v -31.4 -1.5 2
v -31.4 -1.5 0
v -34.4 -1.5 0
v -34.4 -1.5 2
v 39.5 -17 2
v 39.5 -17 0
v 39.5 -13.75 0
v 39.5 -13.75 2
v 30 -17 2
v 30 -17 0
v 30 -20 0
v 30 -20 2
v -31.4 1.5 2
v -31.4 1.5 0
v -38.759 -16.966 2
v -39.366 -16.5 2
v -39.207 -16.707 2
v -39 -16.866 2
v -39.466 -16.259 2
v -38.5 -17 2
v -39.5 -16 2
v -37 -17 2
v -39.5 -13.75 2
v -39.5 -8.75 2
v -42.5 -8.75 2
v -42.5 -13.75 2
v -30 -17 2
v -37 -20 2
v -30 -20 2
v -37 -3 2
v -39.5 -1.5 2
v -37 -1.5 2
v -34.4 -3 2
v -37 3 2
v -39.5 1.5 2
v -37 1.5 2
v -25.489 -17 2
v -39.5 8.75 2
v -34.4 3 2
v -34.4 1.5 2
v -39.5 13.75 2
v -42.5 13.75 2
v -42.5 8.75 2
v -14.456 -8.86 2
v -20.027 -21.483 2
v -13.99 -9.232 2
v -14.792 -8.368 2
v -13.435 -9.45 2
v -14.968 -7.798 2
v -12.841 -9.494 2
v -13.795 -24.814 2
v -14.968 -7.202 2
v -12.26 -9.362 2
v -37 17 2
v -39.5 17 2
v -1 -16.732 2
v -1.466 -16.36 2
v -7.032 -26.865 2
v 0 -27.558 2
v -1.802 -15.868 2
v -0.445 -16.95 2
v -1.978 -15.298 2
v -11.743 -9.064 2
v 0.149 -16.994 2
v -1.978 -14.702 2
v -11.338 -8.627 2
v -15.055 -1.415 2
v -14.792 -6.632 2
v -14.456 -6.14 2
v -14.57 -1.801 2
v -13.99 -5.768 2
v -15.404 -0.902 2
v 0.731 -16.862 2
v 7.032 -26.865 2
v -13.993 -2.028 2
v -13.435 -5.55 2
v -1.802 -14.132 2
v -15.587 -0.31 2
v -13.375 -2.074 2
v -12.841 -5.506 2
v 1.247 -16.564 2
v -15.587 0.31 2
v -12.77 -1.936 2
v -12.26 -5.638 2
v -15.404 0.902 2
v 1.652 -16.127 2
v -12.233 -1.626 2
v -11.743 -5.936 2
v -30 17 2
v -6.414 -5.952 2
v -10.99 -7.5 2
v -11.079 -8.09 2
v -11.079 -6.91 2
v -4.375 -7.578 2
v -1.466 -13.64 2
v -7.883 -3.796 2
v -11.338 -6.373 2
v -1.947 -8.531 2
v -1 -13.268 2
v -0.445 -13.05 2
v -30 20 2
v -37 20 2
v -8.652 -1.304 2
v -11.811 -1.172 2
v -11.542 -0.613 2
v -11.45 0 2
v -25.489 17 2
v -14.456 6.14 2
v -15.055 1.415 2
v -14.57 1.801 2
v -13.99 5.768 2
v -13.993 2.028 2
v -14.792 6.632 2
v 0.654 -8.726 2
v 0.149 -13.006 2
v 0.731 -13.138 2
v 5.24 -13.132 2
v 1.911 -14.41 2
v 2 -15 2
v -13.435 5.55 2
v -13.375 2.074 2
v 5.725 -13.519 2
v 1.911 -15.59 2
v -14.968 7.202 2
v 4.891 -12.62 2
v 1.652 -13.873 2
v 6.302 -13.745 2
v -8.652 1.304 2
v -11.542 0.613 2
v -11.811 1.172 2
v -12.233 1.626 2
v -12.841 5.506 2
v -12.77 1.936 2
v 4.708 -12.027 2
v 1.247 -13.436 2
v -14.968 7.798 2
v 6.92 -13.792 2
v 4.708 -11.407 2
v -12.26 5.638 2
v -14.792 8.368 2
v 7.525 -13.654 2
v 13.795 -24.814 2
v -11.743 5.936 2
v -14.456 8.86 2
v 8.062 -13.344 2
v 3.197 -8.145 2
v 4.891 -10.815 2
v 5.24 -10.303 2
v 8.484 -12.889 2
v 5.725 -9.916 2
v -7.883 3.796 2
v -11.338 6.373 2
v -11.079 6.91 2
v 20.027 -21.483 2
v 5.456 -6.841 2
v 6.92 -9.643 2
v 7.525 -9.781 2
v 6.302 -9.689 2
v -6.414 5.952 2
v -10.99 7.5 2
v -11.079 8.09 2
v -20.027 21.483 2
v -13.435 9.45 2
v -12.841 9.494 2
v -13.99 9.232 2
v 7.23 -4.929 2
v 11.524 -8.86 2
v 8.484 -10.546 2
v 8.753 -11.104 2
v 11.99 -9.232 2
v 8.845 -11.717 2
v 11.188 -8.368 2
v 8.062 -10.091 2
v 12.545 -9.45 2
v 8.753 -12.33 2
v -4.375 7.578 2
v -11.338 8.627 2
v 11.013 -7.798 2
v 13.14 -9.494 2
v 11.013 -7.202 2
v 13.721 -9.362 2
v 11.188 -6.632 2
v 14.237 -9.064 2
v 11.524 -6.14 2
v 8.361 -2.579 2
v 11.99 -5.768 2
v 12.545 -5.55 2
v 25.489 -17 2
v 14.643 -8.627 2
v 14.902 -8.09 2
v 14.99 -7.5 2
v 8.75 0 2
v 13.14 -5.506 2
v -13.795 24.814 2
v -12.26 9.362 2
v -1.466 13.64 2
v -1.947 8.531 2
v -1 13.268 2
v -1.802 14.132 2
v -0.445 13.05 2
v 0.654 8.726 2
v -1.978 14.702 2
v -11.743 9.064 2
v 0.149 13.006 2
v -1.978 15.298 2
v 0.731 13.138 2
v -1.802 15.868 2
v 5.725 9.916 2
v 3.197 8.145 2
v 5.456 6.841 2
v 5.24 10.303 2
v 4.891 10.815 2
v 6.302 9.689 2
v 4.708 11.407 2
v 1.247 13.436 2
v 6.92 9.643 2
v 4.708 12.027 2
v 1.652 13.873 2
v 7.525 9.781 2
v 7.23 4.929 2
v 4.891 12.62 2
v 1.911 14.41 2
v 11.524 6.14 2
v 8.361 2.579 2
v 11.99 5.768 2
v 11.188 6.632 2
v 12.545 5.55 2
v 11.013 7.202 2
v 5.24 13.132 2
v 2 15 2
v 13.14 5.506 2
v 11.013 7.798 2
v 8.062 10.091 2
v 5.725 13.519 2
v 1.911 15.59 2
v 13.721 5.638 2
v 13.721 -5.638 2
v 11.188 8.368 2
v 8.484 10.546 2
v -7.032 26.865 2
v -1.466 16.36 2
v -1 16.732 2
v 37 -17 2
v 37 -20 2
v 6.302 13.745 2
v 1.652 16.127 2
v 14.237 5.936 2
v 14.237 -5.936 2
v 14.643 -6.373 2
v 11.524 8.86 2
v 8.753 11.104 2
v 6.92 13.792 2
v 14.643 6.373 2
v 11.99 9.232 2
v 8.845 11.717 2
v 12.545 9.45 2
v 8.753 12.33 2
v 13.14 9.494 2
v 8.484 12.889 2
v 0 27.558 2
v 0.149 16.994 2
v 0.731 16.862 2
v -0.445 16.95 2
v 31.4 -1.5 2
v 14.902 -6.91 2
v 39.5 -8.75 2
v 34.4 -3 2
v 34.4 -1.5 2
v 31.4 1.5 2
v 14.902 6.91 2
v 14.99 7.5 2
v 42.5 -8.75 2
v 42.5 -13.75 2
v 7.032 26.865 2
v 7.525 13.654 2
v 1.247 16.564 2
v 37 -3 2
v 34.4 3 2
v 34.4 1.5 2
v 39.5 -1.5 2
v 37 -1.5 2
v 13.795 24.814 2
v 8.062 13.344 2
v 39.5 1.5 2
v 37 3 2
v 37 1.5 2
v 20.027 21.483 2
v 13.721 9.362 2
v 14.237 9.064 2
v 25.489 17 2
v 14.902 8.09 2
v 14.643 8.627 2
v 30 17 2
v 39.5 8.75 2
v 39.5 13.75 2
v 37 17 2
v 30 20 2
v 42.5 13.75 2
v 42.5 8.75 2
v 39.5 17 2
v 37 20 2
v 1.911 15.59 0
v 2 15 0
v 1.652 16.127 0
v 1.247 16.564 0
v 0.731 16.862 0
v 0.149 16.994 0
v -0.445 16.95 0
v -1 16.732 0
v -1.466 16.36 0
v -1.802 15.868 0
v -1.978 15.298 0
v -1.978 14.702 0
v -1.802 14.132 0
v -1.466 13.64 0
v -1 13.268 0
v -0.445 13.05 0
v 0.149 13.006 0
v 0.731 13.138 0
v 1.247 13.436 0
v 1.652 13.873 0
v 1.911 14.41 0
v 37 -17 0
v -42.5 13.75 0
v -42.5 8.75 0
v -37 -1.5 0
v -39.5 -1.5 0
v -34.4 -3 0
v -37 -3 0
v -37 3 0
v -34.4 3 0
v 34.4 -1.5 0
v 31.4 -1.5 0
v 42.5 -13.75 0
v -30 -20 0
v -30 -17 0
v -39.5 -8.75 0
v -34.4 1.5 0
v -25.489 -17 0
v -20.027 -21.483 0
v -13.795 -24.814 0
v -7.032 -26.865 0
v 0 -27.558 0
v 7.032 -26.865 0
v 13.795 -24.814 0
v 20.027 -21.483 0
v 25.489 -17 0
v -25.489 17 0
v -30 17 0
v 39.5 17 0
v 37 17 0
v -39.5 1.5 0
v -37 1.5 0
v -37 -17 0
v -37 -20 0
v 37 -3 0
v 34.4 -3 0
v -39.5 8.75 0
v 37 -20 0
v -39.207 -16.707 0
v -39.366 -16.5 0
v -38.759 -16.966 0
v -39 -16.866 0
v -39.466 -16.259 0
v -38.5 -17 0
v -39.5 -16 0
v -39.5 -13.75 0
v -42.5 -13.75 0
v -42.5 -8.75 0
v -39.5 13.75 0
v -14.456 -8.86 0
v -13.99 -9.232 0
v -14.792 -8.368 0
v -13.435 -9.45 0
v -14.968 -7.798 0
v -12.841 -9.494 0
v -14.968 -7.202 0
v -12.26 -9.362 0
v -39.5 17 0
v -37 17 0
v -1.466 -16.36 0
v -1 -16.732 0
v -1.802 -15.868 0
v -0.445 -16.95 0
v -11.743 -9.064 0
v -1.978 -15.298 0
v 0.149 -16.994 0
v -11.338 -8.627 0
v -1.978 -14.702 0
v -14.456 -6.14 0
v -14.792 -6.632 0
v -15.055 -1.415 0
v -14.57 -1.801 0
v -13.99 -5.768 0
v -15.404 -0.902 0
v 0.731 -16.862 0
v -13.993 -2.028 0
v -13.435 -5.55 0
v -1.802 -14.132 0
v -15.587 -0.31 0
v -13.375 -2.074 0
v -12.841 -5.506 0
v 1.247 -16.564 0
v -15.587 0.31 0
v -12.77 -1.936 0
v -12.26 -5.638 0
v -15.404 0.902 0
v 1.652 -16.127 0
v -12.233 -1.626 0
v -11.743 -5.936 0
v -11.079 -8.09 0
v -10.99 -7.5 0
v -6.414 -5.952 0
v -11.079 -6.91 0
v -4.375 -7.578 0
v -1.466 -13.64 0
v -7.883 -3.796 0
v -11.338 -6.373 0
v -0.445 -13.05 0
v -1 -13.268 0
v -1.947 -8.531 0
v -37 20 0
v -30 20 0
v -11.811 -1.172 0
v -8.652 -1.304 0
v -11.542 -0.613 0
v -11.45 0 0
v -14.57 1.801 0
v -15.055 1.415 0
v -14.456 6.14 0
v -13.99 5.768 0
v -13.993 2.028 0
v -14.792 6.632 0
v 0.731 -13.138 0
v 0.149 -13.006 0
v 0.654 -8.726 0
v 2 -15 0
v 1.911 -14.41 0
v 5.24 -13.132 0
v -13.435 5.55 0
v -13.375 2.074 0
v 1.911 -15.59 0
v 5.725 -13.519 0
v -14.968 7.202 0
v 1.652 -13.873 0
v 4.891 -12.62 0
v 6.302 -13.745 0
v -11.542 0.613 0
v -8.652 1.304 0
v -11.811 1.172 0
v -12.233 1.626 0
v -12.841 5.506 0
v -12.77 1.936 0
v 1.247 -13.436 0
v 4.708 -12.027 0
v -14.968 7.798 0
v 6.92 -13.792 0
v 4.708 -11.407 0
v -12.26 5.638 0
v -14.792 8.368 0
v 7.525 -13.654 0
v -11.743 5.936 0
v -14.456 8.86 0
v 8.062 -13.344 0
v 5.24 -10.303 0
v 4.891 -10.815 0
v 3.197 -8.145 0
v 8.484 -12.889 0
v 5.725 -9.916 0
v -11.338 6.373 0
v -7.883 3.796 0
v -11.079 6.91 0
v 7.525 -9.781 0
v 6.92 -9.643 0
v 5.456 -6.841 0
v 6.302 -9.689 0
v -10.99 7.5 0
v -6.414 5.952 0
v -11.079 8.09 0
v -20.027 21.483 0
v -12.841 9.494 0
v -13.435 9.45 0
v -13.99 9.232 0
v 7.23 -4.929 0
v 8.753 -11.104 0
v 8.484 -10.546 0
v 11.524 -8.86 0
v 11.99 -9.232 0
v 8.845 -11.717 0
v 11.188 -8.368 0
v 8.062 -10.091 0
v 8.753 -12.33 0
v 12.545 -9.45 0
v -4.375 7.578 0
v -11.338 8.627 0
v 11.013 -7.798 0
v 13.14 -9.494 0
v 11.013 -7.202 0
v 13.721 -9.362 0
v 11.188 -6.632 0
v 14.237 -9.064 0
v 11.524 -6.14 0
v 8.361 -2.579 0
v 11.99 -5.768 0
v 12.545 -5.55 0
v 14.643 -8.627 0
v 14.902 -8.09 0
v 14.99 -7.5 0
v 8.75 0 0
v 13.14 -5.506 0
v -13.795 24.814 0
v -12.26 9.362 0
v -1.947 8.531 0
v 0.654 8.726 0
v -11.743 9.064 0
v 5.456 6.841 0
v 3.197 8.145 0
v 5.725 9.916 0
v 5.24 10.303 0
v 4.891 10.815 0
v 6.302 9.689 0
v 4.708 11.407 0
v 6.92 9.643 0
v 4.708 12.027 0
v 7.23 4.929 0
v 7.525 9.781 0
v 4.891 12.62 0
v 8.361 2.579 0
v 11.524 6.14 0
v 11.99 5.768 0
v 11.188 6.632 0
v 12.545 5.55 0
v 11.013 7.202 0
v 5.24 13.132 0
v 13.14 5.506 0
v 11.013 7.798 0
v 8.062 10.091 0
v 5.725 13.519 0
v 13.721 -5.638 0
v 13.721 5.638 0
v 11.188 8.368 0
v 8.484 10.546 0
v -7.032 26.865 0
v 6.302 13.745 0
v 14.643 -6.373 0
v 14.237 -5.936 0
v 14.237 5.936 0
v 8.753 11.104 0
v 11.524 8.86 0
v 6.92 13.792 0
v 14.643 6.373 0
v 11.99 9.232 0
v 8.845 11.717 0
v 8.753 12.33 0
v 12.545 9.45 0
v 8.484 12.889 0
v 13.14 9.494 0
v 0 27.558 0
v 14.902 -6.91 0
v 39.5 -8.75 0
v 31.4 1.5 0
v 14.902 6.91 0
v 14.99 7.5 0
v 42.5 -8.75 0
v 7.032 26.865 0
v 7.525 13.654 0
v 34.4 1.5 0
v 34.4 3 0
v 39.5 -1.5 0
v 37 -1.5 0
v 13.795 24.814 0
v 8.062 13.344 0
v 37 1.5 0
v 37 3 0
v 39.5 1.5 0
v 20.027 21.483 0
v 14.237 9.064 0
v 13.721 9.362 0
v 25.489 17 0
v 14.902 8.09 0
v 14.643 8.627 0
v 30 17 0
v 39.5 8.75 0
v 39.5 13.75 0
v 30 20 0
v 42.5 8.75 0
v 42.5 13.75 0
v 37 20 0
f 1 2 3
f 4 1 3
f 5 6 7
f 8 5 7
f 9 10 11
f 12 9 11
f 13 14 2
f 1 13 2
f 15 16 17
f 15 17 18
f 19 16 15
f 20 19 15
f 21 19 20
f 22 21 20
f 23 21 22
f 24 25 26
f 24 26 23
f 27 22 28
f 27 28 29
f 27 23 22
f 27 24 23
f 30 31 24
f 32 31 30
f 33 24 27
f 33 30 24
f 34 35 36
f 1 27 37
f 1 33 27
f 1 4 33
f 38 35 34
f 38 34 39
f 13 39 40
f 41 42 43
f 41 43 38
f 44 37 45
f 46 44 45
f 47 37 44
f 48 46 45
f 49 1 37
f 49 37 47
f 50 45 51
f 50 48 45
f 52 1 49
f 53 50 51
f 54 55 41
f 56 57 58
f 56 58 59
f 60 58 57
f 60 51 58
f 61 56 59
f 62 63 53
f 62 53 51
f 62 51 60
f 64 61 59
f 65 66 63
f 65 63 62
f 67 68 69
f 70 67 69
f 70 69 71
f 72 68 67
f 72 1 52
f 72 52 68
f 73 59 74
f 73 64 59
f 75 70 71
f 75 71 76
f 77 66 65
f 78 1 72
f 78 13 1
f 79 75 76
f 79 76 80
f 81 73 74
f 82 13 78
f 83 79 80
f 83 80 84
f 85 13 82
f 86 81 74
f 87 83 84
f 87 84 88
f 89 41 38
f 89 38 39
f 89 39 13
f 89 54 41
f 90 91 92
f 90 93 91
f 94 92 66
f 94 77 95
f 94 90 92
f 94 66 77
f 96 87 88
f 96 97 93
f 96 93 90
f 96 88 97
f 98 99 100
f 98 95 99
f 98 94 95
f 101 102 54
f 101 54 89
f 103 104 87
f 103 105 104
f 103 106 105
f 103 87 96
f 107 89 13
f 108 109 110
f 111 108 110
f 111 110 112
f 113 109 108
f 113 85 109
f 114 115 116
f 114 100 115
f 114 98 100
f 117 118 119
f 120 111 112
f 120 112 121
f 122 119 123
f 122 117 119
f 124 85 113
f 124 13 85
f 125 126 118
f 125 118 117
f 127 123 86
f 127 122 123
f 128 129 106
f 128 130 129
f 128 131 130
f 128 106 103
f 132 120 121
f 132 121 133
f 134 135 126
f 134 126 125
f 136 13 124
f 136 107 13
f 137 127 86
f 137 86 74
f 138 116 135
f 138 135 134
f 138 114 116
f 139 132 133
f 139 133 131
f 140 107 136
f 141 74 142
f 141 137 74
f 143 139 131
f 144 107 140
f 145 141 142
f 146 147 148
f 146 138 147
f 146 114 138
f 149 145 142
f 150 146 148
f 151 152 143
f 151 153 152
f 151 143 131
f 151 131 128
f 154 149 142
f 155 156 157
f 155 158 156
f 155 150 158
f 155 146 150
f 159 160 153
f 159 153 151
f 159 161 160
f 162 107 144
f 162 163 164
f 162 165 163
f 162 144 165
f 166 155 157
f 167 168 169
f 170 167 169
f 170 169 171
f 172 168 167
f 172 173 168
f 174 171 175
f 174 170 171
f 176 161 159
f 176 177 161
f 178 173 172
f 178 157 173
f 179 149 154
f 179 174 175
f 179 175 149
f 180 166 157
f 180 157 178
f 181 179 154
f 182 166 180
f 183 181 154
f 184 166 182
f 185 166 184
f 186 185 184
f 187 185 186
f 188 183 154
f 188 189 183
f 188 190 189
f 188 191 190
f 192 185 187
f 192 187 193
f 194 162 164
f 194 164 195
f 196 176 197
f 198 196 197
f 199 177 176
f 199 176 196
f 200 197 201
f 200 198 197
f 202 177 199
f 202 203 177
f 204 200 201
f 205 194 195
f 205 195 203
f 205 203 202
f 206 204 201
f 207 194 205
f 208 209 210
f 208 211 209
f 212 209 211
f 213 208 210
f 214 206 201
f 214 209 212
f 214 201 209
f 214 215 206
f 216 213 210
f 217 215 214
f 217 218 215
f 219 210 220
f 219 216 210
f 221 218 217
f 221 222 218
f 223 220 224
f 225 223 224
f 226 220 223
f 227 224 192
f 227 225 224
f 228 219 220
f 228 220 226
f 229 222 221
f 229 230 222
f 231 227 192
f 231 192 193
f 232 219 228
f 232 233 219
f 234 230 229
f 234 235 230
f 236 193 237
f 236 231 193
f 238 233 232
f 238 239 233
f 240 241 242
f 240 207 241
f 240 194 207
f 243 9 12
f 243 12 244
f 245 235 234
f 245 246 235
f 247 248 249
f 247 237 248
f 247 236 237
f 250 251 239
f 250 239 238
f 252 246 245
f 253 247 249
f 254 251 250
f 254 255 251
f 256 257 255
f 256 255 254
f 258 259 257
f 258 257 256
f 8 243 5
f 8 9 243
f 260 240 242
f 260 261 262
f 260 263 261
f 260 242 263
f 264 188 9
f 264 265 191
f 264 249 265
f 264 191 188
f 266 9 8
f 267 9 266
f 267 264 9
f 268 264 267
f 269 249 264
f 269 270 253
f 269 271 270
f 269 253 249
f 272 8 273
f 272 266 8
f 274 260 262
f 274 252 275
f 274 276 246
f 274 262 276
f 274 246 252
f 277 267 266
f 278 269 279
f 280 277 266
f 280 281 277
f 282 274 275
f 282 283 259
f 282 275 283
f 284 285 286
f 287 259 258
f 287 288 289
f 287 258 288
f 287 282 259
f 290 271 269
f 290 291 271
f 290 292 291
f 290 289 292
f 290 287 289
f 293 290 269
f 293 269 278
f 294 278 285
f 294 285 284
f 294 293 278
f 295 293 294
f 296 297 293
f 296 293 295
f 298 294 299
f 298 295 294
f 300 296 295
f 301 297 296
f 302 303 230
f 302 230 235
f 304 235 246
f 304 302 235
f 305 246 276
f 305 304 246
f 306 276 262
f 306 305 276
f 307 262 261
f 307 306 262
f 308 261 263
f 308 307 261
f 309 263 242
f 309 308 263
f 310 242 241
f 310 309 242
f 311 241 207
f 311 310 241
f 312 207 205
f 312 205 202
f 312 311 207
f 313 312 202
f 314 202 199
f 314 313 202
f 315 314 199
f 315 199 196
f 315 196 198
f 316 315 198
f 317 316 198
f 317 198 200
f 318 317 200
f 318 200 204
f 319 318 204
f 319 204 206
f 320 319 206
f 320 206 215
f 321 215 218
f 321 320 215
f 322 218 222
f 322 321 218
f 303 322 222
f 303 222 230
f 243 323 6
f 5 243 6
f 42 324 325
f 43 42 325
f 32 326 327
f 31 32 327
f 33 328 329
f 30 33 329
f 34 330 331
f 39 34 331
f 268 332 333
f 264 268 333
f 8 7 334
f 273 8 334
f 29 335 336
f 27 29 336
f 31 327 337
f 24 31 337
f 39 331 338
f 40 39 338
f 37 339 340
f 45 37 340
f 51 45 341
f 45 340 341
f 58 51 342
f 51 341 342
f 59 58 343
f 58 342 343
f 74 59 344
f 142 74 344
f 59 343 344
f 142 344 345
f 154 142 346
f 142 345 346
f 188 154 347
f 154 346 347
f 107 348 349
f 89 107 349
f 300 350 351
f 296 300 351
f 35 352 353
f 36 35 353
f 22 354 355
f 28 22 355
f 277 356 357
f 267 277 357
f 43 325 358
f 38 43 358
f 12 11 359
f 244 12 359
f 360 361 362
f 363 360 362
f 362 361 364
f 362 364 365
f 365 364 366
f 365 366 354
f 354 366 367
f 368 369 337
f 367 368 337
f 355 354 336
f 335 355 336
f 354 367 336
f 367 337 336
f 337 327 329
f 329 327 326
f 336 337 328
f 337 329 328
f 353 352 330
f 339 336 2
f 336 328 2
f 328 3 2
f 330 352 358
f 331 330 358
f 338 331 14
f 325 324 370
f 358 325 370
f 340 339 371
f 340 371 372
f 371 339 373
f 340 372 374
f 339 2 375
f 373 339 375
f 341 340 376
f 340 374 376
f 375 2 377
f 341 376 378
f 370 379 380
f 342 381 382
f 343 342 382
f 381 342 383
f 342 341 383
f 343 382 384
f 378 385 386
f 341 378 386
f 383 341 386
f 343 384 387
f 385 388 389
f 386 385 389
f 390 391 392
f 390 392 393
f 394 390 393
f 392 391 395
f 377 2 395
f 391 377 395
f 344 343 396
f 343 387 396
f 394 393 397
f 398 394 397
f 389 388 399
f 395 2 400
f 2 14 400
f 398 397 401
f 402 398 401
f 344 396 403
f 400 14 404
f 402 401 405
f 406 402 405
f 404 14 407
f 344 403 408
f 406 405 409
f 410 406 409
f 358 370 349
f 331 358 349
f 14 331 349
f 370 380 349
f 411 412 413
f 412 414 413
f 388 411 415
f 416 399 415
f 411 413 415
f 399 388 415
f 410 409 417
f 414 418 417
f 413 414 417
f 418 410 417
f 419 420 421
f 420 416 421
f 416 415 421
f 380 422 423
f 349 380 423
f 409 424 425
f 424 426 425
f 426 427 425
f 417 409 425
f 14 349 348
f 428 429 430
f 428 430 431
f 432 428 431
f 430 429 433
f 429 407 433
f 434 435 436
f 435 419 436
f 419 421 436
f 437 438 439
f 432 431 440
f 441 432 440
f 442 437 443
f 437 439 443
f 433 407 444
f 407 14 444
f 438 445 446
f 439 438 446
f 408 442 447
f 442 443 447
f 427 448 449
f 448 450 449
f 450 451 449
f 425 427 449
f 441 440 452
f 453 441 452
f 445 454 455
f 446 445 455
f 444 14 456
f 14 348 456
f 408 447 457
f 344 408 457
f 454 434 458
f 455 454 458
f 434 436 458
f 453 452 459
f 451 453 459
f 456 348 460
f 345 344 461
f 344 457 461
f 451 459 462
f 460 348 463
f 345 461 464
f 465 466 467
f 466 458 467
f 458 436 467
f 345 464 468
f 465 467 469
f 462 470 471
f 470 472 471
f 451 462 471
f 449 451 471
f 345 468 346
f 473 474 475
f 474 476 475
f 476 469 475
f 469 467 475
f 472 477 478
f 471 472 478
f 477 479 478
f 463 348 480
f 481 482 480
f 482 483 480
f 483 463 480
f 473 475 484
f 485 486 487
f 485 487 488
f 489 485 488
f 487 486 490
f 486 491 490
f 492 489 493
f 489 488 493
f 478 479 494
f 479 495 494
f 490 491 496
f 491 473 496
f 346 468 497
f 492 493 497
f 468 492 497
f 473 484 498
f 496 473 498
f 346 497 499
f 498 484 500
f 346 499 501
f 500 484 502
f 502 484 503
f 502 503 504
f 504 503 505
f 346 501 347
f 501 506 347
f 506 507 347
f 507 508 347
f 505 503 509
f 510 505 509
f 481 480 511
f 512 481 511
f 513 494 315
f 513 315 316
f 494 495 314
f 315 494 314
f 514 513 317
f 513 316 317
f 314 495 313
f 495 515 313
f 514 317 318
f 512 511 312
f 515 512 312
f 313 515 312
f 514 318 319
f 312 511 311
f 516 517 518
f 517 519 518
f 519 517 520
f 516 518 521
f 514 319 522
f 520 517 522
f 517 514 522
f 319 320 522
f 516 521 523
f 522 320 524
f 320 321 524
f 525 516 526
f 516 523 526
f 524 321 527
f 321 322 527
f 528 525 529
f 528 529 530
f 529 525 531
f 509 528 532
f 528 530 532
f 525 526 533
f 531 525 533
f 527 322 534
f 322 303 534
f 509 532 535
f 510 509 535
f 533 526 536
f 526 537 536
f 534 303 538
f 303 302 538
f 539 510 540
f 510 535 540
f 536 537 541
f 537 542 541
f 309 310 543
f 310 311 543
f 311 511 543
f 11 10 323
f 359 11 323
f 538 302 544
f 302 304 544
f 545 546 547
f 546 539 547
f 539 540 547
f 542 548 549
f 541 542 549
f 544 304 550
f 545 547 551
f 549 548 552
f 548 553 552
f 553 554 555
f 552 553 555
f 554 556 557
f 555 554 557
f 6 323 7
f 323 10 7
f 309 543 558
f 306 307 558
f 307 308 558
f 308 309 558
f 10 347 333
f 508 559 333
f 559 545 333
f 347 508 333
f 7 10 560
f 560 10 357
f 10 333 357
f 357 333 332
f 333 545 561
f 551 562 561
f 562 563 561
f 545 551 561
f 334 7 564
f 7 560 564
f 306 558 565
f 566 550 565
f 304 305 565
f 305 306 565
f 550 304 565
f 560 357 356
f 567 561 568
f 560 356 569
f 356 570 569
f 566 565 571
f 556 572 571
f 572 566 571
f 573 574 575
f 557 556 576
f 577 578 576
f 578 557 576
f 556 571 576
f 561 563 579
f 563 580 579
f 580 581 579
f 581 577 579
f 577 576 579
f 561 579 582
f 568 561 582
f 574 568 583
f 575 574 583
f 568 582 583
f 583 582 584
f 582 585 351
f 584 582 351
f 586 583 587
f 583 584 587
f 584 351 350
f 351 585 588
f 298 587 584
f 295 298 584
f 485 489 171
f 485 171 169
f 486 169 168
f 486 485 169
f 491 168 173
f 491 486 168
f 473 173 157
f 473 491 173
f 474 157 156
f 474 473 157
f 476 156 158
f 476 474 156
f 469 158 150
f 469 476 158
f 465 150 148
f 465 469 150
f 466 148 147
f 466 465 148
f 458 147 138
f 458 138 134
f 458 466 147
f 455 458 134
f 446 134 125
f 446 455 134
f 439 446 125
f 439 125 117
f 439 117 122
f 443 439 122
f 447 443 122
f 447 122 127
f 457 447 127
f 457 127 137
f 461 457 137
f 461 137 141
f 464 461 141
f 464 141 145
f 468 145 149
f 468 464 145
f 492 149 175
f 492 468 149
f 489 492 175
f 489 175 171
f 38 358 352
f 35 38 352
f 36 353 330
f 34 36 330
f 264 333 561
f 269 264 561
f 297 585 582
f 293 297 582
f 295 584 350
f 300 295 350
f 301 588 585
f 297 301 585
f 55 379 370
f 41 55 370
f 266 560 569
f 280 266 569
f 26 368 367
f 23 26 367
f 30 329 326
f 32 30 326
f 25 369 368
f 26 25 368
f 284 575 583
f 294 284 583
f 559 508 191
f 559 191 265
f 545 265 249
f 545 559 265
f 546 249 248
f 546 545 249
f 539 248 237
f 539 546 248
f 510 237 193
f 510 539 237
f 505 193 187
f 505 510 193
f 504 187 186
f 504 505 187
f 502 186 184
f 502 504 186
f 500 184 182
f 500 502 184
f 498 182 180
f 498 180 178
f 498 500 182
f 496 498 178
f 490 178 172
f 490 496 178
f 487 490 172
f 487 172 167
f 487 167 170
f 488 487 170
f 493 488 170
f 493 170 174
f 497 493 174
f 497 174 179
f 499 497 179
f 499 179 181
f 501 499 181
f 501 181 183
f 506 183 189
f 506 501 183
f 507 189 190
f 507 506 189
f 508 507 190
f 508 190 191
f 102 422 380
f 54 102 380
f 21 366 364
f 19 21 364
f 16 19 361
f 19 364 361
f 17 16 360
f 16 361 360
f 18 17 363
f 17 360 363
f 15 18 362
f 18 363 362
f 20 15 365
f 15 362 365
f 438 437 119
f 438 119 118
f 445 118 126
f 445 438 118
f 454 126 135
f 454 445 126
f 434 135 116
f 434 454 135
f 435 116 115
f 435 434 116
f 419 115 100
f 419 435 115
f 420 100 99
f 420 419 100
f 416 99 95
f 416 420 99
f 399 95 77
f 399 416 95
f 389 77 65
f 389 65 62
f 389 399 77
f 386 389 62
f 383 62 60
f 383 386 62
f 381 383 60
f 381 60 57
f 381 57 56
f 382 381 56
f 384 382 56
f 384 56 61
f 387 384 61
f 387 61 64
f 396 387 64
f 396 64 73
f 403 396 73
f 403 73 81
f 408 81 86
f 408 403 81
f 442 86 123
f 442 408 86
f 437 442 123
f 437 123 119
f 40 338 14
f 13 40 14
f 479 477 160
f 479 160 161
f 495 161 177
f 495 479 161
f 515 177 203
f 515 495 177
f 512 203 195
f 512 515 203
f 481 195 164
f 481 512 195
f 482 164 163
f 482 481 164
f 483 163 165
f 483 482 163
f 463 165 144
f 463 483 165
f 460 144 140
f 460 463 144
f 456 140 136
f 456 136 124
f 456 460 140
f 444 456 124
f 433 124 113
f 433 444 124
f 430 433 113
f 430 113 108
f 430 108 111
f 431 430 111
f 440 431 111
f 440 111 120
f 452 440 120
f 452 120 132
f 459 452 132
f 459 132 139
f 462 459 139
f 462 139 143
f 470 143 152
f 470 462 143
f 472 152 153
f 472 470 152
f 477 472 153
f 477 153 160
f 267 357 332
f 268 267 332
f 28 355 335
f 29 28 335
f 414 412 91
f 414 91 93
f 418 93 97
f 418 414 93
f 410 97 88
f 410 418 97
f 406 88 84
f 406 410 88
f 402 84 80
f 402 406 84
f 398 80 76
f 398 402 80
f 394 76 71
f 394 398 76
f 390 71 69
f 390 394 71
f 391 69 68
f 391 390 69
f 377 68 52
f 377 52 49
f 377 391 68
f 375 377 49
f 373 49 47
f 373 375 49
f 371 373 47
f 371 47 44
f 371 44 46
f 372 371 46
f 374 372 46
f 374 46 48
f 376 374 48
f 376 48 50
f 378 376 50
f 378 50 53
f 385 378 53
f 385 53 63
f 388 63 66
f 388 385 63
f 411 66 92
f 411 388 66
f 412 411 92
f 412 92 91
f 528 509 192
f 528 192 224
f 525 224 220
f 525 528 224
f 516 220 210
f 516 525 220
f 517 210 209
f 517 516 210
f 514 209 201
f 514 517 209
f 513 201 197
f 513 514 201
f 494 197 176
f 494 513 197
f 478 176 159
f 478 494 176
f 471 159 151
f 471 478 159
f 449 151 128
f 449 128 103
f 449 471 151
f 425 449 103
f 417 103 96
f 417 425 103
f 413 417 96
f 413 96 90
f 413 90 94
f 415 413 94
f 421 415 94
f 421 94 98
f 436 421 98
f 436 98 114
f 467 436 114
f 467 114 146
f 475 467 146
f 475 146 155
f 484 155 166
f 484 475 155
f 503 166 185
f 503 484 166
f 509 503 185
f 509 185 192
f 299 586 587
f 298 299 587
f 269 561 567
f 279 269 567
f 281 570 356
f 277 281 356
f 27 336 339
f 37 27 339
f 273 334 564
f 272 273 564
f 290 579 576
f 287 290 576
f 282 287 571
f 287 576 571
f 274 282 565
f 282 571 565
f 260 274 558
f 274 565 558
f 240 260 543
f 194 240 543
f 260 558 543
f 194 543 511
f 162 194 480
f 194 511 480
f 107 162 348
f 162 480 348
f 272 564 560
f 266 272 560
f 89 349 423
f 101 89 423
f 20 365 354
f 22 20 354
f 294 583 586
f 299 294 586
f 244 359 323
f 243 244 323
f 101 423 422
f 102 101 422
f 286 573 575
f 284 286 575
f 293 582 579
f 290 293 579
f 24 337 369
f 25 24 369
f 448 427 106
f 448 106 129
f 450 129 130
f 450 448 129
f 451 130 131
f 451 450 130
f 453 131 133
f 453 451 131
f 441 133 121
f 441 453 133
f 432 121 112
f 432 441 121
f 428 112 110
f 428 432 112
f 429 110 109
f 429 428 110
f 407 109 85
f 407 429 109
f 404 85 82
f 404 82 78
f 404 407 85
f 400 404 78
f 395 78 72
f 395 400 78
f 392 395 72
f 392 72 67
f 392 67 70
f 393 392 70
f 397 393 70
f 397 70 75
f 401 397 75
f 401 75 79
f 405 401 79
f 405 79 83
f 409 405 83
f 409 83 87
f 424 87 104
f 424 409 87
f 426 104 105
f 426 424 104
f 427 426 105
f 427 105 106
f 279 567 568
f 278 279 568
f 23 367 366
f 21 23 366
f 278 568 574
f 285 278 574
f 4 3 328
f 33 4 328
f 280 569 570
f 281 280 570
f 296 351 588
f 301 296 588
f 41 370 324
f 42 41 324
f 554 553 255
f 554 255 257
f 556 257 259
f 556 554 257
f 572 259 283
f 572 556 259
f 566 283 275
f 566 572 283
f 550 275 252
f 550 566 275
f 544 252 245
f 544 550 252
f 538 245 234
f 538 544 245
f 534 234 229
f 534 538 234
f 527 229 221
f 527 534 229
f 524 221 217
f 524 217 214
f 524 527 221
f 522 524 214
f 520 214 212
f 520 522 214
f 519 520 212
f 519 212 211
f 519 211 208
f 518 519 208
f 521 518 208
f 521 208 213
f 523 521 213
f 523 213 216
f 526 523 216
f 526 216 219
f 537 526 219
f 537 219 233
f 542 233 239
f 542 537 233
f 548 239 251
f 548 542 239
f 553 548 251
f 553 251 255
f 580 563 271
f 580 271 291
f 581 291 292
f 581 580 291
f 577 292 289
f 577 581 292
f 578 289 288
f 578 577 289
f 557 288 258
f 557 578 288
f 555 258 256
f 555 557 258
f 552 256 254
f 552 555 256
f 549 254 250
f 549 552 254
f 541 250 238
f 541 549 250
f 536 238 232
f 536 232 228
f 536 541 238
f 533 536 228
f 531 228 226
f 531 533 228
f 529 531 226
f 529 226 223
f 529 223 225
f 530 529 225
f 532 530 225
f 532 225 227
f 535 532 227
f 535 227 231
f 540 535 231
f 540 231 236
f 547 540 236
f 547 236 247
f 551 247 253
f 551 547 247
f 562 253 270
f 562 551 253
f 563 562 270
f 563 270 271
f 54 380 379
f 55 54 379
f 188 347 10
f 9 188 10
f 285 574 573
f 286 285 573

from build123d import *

# Parameters (mm, degrees)
SKETCH_1_R      = 2
SKETCH_1_R_2    = 2.08
SKETCH_1_R_3    = 8.75
EXTRUDE_2_DEPTH = 2


with BuildPart() as part:
    # 草图1 → 凸台-拉伸2 (new body)
    with BuildSketch(Plane.XY):
        with BuildLine():
            Line((-39.5, -13.75), (-39.5, -16))
            ThreePointArc((-39.5, -16), (-39.207106781, -16.707106781), (-38.5, -17))
            Line((-38.5, -17), (-37, -17))
            Line((-37, -17), (-37, -20))
            Line((-37, -20), (-30, -20))
            Line((-30, -20), (-30, -17))
            Line((-30, -17), (-25.488968202, -17))
            ThreePointArc((-25.488968202, -17), (0, -27.55787632), (25.488968202, -17))
            Line((25.488968202, -17), (30, -17))
            Line((30, -17), (30, -20))
            Line((30, -20), (37, -20))
            Line((37, -20), (37, -17))
            Line((37, -17), (39.5, -17))
            Line((39.5, -17), (39.5, -13.75))
            Line((39.5, -13.75), (42.5, -13.75))
            Line((42.5, -13.75), (42.5, -8.75))
            Line((42.5, -8.75), (39.5, -8.75))
            Line((39.5, -8.75), (39.5, -1.5))
            Line((39.5, -1.5), (37, -1.5))
            Line((37, -1.5), (37, -3))
            Line((37, -3), (34.4, -3))
            Line((34.4, -3), (34.4, -1.5))
            Line((34.4, -1.5), (31.4, -1.5))
            Line((31.4, -1.5), (31.4, 1.5))
            Line((31.4, 1.5), (34.4, 1.5))
            Line((34.4, 1.5), (34.4, 3))
            Line((34.4, 3), (37, 3))
            Line((37, 3), (37, 1.5))
            Line((37, 1.5), (39.5, 1.5))
            Line((39.5, 1.5), (39.5, 8.75))
            Line((39.5, 8.75), (42.5, 8.75))
            Line((42.5, 8.75), (42.5, 13.75))
            Line((42.5, 13.75), (39.5, 13.75))
            Line((39.5, 13.75), (39.5, 17))
            Line((39.5, 17), (37, 17))
            Line((37, 17), (37, 20))
            Line((37, 20), (30, 20))
            Line((30, 20), (30, 17))
            Line((30, 17), (25.488968202, 17))
            ThreePointArc((25.488968202, 17), (0, 27.55787632), (-25.488968202, 17))
            Line((-25.488968202, 17), (-30, 17))
            Line((-30, 17), (-30, 20))
            Line((-30, 20), (-37, 20))
            Line((-37, 20), (-37, 17))
            Line((-37, 17), (-39.5, 17))
            Line((-39.5, 17), (-39.5, 13.75))
            Line((-39.5, 13.75), (-42.5, 13.75))
            Line((-42.5, 13.75), (-42.5, 8.75))
            Line((-42.5, 8.75), (-39.5, 8.75))
            Line((-39.5, 8.75), (-39.5, 1.5))
            Line((-39.5, 1.5), (-37, 1.5))
            Line((-37, 1.5), (-37, 3))
            Line((-37, 3), (-34.4, 3))
            Line((-34.4, 3), (-34.4, 1.5))
            Line((-34.4, 1.5), (-31.4, 1.5))
            Line((-31.4, 1.5), (-31.4, -1.5))
            Line((-31.4, -1.5), (-34.4, -1.5))
            Line((-34.4, -1.5), (-34.4, -3))
            Line((-34.4, -3), (-37, -3))
            Line((-37, -3), (-37, -1.5))
            Line((-37, -1.5), (-39.5, -1.5))
            Line((-39.5, -1.5), (-39.5, -8.75))
            Line((-39.5, -8.75), (-42.5, -8.75))
            Line((-42.5, -8.75), (-42.5, -13.75))
            Line((-42.5, -13.75), (-39.5, -13.75))
        make_face()
        with Locations((0, -15)):
            Circle(SKETCH_1_R, mode=Mode.SUBTRACT)
        with Locations((-12.990381057, -7.5)):
            Circle(SKETCH_1_R, mode=Mode.SUBTRACT)
        with Locations((-12.990381057, 7.5)):
            Circle(SKETCH_1_R, mode=Mode.SUBTRACT)
        with Locations((0, 15)):
            Circle(SKETCH_1_R, mode=Mode.SUBTRACT)
        with Locations((12.990381057, 7.5)):
            Circle(SKETCH_1_R, mode=Mode.SUBTRACT)
        with Locations((12.990381057, -7.5)):
            Circle(SKETCH_1_R, mode=Mode.SUBTRACT)
        with Locations((-13.53, 0)):
            Circle(SKETCH_1_R_2, mode=Mode.SUBTRACT)
        with Locations((6.765, 11.717323713)):
            Circle(SKETCH_1_R_2, mode=Mode.SUBTRACT)
        with Locations((6.765, -11.717323713)):
            Circle(SKETCH_1_R_2, mode=Mode.SUBTRACT)
        Circle(SKETCH_1_R_3, mode=Mode.SUBTRACT)
    extrude(amount=EXTRUDE_2_DEPTH)


solid = part.part
